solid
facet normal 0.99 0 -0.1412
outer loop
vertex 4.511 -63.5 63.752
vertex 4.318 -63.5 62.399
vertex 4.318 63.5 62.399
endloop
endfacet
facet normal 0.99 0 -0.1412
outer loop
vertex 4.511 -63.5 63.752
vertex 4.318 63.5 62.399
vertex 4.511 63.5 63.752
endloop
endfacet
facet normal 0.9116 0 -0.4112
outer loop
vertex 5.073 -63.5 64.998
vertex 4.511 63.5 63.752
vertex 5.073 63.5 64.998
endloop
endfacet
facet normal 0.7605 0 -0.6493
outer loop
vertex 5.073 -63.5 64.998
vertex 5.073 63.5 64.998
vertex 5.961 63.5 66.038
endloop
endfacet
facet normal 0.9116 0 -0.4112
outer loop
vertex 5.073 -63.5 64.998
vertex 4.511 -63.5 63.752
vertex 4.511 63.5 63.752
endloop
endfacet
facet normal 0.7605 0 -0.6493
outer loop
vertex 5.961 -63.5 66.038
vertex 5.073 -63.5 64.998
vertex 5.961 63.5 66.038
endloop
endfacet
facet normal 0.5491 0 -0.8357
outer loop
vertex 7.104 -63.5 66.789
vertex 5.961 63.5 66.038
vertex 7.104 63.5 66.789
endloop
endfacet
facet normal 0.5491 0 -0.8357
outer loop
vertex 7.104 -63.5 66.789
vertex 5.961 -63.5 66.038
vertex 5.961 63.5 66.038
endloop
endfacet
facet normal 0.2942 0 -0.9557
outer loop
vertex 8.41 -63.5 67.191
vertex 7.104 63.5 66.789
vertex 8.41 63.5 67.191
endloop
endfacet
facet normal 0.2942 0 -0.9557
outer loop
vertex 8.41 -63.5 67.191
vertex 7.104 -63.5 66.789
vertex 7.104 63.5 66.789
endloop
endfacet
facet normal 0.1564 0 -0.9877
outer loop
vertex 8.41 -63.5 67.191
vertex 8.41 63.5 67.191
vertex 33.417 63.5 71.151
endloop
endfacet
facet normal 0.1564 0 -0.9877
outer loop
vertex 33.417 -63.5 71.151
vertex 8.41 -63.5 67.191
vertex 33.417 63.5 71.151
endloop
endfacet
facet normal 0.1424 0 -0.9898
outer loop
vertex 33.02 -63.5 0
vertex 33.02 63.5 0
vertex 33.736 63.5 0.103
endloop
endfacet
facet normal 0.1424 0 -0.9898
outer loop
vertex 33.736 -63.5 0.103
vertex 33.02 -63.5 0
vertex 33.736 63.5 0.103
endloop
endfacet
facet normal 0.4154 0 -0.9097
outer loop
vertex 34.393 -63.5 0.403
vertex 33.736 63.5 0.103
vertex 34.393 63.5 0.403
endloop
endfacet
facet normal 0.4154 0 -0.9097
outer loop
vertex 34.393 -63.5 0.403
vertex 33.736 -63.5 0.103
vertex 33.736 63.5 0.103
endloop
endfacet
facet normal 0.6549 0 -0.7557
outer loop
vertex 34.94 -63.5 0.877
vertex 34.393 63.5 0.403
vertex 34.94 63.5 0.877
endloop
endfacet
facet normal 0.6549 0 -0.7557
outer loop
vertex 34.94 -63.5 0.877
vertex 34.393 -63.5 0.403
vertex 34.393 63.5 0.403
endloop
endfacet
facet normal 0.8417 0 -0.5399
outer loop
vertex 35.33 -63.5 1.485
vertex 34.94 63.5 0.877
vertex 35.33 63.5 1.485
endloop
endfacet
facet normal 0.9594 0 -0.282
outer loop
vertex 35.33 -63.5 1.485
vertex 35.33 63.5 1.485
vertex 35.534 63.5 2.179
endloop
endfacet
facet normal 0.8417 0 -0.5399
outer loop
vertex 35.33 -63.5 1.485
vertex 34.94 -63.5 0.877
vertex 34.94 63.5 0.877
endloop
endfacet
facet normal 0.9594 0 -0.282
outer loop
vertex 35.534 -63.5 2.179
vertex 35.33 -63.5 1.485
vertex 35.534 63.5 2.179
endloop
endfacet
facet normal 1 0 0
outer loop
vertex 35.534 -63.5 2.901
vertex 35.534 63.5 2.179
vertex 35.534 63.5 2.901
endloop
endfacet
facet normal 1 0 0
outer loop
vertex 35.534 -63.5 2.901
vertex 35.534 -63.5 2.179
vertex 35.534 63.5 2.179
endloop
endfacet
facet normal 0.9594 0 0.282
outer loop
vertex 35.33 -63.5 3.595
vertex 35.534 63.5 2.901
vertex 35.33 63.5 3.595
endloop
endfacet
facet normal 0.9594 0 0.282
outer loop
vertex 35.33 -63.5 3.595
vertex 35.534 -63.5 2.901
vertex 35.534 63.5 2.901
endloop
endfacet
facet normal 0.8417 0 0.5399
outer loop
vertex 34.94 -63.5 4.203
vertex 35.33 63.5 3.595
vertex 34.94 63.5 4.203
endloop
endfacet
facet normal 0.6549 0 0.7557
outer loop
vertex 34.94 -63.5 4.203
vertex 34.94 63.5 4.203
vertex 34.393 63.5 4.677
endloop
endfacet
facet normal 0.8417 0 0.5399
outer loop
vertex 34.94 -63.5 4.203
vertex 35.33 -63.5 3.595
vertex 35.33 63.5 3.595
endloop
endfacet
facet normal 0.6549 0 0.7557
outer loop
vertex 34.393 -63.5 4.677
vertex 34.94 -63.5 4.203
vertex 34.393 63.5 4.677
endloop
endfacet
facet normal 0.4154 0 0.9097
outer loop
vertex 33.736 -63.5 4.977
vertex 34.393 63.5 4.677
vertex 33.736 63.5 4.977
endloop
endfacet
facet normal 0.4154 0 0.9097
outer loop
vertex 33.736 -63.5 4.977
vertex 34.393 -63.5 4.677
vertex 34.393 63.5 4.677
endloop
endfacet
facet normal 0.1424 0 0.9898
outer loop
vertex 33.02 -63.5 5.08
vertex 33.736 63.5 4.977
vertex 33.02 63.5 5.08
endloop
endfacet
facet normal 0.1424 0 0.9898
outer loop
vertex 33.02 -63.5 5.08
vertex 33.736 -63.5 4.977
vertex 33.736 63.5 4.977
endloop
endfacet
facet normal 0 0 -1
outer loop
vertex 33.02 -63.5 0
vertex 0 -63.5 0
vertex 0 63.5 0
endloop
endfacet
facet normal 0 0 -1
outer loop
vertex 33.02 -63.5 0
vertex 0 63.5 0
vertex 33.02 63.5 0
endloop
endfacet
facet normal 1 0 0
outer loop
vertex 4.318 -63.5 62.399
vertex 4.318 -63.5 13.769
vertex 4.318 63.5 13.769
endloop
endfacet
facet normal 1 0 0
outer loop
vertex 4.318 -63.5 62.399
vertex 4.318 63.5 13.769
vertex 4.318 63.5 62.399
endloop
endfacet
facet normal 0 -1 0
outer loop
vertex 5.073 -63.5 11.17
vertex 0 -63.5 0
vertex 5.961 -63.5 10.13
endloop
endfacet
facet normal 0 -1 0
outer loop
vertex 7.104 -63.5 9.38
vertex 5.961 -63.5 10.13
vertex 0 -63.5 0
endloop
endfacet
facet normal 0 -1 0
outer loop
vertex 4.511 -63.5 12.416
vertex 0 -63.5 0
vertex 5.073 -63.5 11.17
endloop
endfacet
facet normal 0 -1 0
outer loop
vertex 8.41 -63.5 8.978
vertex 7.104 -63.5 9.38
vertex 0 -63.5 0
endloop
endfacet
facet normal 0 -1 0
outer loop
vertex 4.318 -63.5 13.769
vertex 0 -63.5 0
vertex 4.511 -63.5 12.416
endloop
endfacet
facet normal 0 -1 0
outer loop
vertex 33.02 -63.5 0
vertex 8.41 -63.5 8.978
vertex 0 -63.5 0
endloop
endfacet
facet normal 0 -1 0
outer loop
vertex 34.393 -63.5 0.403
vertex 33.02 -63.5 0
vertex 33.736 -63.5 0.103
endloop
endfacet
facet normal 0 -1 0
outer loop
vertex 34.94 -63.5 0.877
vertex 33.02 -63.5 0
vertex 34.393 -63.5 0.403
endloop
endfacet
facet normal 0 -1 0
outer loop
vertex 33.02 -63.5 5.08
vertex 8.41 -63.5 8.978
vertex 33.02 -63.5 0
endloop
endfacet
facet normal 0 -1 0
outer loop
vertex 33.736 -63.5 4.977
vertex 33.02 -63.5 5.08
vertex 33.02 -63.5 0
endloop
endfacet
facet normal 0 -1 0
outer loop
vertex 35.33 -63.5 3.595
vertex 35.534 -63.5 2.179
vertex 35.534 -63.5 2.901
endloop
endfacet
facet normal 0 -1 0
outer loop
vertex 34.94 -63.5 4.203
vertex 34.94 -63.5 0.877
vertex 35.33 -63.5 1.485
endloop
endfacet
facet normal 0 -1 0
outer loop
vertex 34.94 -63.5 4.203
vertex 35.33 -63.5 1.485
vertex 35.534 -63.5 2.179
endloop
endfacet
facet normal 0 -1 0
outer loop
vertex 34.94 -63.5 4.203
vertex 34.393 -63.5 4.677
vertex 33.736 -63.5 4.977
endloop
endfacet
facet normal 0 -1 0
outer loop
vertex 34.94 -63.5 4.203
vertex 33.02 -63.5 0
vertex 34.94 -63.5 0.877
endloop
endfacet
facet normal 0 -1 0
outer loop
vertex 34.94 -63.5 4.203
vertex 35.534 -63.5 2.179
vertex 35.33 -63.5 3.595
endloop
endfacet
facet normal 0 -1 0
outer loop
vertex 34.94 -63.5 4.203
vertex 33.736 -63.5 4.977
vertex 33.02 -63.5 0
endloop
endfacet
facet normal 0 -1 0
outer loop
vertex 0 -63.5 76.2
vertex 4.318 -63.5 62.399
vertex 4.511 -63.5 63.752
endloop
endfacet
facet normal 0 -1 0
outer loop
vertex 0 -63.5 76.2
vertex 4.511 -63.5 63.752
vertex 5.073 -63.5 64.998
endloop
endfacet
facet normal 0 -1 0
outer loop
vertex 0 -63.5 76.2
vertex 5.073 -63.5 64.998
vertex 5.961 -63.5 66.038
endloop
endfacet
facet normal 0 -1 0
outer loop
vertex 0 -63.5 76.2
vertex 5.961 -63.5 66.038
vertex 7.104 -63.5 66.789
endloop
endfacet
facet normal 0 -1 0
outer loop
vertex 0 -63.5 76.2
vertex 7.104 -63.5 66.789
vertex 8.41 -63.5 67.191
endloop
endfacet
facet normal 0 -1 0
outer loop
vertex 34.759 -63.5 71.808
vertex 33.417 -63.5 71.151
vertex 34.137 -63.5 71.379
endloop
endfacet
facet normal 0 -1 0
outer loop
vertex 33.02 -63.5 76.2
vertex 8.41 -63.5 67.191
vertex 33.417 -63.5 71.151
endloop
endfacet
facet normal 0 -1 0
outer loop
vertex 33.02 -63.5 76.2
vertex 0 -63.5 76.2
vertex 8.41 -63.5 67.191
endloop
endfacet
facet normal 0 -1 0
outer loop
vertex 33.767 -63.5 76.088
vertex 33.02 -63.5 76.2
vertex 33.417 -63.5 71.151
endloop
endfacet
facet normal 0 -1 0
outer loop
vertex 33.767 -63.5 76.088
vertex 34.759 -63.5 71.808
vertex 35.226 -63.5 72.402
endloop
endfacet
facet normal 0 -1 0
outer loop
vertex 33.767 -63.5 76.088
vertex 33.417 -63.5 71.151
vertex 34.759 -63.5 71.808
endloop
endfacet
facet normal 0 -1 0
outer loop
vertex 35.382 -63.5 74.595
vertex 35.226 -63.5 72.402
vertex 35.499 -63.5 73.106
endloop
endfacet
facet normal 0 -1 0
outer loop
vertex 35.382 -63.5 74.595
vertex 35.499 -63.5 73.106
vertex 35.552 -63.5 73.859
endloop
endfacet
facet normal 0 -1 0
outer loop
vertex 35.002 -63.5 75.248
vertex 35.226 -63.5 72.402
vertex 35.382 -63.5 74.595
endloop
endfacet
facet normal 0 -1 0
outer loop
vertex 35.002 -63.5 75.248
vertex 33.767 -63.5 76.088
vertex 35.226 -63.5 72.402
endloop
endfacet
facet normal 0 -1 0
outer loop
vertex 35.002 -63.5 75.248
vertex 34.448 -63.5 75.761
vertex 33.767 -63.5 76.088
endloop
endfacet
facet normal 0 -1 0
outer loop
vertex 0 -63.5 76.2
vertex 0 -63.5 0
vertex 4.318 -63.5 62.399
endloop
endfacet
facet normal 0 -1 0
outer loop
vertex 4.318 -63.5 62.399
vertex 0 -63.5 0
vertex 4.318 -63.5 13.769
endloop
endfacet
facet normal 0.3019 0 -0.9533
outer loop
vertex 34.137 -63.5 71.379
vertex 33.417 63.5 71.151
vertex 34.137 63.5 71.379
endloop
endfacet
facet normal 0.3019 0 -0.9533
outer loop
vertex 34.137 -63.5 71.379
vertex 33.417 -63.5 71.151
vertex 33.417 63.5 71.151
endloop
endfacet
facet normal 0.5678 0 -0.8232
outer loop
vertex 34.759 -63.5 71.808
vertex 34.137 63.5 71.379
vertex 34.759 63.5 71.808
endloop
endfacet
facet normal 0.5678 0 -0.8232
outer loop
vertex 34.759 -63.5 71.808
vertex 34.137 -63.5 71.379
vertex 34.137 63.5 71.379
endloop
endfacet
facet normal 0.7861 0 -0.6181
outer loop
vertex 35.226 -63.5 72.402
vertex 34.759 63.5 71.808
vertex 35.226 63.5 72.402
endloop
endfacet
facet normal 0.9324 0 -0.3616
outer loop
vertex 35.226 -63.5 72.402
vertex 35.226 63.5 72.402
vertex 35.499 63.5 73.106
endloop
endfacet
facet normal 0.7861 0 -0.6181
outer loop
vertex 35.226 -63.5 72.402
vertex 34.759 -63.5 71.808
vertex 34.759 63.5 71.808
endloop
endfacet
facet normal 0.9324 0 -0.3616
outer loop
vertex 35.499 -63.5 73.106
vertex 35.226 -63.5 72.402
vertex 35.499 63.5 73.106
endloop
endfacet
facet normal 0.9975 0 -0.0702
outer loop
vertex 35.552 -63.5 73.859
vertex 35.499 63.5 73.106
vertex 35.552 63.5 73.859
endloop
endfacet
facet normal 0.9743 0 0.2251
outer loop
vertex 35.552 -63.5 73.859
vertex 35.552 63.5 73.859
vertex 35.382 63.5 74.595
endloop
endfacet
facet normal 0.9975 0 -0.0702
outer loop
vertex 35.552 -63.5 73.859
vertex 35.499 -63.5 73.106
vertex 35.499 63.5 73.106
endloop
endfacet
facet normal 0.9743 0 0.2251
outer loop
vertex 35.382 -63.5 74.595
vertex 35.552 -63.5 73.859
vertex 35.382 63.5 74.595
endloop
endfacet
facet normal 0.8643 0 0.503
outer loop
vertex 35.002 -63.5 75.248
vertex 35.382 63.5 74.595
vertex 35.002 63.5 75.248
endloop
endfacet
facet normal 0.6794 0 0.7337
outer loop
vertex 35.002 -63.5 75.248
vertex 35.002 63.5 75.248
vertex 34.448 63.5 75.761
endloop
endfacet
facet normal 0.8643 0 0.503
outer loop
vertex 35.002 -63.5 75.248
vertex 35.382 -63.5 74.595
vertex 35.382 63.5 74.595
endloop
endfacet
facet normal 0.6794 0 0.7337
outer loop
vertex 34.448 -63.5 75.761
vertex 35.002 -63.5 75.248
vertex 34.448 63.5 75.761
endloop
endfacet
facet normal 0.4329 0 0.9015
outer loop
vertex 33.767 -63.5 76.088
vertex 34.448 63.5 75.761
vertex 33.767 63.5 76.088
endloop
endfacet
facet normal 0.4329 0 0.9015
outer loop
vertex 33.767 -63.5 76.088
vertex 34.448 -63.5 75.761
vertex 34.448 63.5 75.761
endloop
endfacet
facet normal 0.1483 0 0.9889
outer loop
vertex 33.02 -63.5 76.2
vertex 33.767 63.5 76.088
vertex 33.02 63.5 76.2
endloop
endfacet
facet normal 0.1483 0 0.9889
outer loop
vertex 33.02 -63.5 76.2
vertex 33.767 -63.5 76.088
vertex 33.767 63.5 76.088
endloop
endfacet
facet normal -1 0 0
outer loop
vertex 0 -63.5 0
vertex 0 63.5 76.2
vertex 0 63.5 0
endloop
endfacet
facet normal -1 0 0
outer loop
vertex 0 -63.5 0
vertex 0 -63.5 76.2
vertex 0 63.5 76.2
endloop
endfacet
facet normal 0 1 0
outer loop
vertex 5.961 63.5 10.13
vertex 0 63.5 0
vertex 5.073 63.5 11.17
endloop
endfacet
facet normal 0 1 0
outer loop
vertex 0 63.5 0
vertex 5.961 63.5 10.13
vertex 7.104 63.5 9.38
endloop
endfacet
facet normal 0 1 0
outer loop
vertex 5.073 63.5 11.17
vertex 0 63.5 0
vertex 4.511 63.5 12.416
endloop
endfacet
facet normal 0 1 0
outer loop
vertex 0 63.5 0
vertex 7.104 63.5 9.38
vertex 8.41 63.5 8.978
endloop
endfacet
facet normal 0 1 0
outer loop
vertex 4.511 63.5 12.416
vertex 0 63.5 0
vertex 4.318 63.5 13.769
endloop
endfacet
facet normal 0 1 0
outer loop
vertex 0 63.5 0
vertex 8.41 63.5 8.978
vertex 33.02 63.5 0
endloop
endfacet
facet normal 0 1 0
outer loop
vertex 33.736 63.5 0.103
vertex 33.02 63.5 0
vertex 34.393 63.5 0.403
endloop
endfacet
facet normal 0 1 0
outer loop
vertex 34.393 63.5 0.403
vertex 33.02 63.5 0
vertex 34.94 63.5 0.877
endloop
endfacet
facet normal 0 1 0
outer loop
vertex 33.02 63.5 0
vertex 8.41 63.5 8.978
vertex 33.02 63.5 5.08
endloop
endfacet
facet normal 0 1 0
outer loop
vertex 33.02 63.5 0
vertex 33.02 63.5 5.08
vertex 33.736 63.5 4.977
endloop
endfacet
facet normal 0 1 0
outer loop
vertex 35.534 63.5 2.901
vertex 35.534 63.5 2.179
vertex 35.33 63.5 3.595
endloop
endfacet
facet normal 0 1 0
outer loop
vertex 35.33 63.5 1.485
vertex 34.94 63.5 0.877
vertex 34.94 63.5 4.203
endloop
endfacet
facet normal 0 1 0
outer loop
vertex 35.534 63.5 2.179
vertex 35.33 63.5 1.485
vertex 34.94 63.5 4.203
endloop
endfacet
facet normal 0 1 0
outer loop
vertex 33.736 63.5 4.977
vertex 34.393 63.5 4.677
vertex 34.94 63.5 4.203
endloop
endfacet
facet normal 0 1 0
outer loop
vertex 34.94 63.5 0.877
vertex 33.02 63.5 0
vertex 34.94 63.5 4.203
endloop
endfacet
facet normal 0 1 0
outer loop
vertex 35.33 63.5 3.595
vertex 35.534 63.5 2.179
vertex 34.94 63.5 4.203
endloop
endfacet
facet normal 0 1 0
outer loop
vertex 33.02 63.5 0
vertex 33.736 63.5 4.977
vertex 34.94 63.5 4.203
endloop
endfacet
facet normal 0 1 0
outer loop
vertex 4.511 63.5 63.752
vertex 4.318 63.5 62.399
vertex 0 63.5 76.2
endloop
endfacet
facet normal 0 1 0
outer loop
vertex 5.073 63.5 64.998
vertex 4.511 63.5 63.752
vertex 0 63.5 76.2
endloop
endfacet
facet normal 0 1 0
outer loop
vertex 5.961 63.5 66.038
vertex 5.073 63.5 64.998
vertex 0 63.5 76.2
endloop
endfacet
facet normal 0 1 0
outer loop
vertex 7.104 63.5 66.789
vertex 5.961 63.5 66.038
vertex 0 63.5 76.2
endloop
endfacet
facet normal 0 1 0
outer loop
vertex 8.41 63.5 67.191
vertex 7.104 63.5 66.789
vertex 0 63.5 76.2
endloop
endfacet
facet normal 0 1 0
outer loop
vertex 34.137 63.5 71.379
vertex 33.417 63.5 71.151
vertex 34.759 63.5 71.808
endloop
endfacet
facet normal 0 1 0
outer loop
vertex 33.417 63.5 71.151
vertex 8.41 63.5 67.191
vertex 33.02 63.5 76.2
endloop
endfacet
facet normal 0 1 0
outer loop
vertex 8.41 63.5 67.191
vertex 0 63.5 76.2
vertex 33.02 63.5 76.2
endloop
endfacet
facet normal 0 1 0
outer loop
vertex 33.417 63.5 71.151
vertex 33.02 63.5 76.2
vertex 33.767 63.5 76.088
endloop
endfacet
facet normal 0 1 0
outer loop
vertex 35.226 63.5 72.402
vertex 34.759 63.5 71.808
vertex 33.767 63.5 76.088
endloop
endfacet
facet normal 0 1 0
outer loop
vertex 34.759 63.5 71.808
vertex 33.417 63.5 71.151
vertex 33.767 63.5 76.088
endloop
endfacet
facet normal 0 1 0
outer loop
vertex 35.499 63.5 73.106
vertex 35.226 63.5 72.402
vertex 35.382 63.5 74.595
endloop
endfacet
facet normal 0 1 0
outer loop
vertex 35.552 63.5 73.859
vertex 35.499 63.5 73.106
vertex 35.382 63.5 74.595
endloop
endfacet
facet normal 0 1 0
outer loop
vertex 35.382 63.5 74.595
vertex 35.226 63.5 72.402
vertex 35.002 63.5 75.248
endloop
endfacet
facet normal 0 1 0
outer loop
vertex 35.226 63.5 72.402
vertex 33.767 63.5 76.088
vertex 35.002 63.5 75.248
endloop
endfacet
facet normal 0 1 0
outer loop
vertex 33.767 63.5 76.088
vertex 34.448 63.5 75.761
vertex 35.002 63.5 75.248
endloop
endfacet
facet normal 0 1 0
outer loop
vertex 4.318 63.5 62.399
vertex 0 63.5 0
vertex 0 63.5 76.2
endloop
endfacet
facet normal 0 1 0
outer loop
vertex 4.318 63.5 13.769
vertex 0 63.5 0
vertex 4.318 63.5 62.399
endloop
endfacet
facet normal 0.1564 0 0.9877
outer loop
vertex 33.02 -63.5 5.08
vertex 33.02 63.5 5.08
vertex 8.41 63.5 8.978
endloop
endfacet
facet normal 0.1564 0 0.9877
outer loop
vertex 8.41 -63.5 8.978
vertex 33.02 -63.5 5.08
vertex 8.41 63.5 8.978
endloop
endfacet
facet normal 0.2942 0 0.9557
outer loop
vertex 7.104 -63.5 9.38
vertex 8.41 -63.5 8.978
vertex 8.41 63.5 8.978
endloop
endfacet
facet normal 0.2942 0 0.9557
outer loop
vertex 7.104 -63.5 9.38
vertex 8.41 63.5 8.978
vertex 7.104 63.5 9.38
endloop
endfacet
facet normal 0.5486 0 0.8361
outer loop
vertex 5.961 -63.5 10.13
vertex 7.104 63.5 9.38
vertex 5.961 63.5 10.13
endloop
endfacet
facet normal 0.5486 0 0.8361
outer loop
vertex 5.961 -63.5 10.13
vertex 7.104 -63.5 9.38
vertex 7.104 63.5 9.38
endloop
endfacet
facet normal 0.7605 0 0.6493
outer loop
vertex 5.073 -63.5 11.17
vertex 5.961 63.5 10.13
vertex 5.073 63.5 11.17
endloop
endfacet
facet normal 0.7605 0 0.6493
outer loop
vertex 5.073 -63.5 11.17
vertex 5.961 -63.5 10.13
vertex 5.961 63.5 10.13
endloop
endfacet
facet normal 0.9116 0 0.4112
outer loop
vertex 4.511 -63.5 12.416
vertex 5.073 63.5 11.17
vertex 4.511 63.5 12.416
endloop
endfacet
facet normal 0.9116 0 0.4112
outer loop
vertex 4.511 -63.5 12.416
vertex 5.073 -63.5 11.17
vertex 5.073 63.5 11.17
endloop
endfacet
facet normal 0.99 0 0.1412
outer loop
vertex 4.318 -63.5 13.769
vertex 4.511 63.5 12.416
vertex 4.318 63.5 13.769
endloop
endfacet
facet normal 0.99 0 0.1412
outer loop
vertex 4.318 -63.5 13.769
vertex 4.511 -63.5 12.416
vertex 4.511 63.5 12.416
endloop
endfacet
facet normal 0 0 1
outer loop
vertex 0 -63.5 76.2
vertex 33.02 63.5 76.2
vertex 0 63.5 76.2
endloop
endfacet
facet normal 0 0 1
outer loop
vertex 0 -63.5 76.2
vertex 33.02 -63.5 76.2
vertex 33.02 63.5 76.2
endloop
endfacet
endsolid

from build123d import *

# Parameters (mm, degrees)
F1_DEPTH = 63.5


with BuildPart() as f1:
    # F0 (on Front) → F1 (new body, symmetric)
    with BuildSketch(Plane.XZ):
        with BuildLine():
            Line((0, 76.2), (0, 0))
            Line((0, 0), (33.02, 0))
            ThreePointArc((33.02, 0), (35.56, 2.54), (33.02, 5.08))
            Line((33.02, 5.08), (8.410474, 8.977766))
            ThreePointArc((8.410474, 8.977766), (5.480366, 10.618705), (4.318, 13.769437))
            Line((4.318, 13.769437), (4.318, 62.398901))
            ThreePointArc((4.318, 62.398901), (5.480366, 65.549634), (8.410474, 67.190573))
            Line((8.410474, 67.190573), (33.417344, 71.151272))
            ThreePointArc((33.417344, 71.151272), (35.55217, 73.859286), (33.02, 76.2))
            Line((33.02, 76.2), (0, 76.2))
        make_face()
    extrude(amount=F1_DEPTH, both=True)


solid = f1.part
